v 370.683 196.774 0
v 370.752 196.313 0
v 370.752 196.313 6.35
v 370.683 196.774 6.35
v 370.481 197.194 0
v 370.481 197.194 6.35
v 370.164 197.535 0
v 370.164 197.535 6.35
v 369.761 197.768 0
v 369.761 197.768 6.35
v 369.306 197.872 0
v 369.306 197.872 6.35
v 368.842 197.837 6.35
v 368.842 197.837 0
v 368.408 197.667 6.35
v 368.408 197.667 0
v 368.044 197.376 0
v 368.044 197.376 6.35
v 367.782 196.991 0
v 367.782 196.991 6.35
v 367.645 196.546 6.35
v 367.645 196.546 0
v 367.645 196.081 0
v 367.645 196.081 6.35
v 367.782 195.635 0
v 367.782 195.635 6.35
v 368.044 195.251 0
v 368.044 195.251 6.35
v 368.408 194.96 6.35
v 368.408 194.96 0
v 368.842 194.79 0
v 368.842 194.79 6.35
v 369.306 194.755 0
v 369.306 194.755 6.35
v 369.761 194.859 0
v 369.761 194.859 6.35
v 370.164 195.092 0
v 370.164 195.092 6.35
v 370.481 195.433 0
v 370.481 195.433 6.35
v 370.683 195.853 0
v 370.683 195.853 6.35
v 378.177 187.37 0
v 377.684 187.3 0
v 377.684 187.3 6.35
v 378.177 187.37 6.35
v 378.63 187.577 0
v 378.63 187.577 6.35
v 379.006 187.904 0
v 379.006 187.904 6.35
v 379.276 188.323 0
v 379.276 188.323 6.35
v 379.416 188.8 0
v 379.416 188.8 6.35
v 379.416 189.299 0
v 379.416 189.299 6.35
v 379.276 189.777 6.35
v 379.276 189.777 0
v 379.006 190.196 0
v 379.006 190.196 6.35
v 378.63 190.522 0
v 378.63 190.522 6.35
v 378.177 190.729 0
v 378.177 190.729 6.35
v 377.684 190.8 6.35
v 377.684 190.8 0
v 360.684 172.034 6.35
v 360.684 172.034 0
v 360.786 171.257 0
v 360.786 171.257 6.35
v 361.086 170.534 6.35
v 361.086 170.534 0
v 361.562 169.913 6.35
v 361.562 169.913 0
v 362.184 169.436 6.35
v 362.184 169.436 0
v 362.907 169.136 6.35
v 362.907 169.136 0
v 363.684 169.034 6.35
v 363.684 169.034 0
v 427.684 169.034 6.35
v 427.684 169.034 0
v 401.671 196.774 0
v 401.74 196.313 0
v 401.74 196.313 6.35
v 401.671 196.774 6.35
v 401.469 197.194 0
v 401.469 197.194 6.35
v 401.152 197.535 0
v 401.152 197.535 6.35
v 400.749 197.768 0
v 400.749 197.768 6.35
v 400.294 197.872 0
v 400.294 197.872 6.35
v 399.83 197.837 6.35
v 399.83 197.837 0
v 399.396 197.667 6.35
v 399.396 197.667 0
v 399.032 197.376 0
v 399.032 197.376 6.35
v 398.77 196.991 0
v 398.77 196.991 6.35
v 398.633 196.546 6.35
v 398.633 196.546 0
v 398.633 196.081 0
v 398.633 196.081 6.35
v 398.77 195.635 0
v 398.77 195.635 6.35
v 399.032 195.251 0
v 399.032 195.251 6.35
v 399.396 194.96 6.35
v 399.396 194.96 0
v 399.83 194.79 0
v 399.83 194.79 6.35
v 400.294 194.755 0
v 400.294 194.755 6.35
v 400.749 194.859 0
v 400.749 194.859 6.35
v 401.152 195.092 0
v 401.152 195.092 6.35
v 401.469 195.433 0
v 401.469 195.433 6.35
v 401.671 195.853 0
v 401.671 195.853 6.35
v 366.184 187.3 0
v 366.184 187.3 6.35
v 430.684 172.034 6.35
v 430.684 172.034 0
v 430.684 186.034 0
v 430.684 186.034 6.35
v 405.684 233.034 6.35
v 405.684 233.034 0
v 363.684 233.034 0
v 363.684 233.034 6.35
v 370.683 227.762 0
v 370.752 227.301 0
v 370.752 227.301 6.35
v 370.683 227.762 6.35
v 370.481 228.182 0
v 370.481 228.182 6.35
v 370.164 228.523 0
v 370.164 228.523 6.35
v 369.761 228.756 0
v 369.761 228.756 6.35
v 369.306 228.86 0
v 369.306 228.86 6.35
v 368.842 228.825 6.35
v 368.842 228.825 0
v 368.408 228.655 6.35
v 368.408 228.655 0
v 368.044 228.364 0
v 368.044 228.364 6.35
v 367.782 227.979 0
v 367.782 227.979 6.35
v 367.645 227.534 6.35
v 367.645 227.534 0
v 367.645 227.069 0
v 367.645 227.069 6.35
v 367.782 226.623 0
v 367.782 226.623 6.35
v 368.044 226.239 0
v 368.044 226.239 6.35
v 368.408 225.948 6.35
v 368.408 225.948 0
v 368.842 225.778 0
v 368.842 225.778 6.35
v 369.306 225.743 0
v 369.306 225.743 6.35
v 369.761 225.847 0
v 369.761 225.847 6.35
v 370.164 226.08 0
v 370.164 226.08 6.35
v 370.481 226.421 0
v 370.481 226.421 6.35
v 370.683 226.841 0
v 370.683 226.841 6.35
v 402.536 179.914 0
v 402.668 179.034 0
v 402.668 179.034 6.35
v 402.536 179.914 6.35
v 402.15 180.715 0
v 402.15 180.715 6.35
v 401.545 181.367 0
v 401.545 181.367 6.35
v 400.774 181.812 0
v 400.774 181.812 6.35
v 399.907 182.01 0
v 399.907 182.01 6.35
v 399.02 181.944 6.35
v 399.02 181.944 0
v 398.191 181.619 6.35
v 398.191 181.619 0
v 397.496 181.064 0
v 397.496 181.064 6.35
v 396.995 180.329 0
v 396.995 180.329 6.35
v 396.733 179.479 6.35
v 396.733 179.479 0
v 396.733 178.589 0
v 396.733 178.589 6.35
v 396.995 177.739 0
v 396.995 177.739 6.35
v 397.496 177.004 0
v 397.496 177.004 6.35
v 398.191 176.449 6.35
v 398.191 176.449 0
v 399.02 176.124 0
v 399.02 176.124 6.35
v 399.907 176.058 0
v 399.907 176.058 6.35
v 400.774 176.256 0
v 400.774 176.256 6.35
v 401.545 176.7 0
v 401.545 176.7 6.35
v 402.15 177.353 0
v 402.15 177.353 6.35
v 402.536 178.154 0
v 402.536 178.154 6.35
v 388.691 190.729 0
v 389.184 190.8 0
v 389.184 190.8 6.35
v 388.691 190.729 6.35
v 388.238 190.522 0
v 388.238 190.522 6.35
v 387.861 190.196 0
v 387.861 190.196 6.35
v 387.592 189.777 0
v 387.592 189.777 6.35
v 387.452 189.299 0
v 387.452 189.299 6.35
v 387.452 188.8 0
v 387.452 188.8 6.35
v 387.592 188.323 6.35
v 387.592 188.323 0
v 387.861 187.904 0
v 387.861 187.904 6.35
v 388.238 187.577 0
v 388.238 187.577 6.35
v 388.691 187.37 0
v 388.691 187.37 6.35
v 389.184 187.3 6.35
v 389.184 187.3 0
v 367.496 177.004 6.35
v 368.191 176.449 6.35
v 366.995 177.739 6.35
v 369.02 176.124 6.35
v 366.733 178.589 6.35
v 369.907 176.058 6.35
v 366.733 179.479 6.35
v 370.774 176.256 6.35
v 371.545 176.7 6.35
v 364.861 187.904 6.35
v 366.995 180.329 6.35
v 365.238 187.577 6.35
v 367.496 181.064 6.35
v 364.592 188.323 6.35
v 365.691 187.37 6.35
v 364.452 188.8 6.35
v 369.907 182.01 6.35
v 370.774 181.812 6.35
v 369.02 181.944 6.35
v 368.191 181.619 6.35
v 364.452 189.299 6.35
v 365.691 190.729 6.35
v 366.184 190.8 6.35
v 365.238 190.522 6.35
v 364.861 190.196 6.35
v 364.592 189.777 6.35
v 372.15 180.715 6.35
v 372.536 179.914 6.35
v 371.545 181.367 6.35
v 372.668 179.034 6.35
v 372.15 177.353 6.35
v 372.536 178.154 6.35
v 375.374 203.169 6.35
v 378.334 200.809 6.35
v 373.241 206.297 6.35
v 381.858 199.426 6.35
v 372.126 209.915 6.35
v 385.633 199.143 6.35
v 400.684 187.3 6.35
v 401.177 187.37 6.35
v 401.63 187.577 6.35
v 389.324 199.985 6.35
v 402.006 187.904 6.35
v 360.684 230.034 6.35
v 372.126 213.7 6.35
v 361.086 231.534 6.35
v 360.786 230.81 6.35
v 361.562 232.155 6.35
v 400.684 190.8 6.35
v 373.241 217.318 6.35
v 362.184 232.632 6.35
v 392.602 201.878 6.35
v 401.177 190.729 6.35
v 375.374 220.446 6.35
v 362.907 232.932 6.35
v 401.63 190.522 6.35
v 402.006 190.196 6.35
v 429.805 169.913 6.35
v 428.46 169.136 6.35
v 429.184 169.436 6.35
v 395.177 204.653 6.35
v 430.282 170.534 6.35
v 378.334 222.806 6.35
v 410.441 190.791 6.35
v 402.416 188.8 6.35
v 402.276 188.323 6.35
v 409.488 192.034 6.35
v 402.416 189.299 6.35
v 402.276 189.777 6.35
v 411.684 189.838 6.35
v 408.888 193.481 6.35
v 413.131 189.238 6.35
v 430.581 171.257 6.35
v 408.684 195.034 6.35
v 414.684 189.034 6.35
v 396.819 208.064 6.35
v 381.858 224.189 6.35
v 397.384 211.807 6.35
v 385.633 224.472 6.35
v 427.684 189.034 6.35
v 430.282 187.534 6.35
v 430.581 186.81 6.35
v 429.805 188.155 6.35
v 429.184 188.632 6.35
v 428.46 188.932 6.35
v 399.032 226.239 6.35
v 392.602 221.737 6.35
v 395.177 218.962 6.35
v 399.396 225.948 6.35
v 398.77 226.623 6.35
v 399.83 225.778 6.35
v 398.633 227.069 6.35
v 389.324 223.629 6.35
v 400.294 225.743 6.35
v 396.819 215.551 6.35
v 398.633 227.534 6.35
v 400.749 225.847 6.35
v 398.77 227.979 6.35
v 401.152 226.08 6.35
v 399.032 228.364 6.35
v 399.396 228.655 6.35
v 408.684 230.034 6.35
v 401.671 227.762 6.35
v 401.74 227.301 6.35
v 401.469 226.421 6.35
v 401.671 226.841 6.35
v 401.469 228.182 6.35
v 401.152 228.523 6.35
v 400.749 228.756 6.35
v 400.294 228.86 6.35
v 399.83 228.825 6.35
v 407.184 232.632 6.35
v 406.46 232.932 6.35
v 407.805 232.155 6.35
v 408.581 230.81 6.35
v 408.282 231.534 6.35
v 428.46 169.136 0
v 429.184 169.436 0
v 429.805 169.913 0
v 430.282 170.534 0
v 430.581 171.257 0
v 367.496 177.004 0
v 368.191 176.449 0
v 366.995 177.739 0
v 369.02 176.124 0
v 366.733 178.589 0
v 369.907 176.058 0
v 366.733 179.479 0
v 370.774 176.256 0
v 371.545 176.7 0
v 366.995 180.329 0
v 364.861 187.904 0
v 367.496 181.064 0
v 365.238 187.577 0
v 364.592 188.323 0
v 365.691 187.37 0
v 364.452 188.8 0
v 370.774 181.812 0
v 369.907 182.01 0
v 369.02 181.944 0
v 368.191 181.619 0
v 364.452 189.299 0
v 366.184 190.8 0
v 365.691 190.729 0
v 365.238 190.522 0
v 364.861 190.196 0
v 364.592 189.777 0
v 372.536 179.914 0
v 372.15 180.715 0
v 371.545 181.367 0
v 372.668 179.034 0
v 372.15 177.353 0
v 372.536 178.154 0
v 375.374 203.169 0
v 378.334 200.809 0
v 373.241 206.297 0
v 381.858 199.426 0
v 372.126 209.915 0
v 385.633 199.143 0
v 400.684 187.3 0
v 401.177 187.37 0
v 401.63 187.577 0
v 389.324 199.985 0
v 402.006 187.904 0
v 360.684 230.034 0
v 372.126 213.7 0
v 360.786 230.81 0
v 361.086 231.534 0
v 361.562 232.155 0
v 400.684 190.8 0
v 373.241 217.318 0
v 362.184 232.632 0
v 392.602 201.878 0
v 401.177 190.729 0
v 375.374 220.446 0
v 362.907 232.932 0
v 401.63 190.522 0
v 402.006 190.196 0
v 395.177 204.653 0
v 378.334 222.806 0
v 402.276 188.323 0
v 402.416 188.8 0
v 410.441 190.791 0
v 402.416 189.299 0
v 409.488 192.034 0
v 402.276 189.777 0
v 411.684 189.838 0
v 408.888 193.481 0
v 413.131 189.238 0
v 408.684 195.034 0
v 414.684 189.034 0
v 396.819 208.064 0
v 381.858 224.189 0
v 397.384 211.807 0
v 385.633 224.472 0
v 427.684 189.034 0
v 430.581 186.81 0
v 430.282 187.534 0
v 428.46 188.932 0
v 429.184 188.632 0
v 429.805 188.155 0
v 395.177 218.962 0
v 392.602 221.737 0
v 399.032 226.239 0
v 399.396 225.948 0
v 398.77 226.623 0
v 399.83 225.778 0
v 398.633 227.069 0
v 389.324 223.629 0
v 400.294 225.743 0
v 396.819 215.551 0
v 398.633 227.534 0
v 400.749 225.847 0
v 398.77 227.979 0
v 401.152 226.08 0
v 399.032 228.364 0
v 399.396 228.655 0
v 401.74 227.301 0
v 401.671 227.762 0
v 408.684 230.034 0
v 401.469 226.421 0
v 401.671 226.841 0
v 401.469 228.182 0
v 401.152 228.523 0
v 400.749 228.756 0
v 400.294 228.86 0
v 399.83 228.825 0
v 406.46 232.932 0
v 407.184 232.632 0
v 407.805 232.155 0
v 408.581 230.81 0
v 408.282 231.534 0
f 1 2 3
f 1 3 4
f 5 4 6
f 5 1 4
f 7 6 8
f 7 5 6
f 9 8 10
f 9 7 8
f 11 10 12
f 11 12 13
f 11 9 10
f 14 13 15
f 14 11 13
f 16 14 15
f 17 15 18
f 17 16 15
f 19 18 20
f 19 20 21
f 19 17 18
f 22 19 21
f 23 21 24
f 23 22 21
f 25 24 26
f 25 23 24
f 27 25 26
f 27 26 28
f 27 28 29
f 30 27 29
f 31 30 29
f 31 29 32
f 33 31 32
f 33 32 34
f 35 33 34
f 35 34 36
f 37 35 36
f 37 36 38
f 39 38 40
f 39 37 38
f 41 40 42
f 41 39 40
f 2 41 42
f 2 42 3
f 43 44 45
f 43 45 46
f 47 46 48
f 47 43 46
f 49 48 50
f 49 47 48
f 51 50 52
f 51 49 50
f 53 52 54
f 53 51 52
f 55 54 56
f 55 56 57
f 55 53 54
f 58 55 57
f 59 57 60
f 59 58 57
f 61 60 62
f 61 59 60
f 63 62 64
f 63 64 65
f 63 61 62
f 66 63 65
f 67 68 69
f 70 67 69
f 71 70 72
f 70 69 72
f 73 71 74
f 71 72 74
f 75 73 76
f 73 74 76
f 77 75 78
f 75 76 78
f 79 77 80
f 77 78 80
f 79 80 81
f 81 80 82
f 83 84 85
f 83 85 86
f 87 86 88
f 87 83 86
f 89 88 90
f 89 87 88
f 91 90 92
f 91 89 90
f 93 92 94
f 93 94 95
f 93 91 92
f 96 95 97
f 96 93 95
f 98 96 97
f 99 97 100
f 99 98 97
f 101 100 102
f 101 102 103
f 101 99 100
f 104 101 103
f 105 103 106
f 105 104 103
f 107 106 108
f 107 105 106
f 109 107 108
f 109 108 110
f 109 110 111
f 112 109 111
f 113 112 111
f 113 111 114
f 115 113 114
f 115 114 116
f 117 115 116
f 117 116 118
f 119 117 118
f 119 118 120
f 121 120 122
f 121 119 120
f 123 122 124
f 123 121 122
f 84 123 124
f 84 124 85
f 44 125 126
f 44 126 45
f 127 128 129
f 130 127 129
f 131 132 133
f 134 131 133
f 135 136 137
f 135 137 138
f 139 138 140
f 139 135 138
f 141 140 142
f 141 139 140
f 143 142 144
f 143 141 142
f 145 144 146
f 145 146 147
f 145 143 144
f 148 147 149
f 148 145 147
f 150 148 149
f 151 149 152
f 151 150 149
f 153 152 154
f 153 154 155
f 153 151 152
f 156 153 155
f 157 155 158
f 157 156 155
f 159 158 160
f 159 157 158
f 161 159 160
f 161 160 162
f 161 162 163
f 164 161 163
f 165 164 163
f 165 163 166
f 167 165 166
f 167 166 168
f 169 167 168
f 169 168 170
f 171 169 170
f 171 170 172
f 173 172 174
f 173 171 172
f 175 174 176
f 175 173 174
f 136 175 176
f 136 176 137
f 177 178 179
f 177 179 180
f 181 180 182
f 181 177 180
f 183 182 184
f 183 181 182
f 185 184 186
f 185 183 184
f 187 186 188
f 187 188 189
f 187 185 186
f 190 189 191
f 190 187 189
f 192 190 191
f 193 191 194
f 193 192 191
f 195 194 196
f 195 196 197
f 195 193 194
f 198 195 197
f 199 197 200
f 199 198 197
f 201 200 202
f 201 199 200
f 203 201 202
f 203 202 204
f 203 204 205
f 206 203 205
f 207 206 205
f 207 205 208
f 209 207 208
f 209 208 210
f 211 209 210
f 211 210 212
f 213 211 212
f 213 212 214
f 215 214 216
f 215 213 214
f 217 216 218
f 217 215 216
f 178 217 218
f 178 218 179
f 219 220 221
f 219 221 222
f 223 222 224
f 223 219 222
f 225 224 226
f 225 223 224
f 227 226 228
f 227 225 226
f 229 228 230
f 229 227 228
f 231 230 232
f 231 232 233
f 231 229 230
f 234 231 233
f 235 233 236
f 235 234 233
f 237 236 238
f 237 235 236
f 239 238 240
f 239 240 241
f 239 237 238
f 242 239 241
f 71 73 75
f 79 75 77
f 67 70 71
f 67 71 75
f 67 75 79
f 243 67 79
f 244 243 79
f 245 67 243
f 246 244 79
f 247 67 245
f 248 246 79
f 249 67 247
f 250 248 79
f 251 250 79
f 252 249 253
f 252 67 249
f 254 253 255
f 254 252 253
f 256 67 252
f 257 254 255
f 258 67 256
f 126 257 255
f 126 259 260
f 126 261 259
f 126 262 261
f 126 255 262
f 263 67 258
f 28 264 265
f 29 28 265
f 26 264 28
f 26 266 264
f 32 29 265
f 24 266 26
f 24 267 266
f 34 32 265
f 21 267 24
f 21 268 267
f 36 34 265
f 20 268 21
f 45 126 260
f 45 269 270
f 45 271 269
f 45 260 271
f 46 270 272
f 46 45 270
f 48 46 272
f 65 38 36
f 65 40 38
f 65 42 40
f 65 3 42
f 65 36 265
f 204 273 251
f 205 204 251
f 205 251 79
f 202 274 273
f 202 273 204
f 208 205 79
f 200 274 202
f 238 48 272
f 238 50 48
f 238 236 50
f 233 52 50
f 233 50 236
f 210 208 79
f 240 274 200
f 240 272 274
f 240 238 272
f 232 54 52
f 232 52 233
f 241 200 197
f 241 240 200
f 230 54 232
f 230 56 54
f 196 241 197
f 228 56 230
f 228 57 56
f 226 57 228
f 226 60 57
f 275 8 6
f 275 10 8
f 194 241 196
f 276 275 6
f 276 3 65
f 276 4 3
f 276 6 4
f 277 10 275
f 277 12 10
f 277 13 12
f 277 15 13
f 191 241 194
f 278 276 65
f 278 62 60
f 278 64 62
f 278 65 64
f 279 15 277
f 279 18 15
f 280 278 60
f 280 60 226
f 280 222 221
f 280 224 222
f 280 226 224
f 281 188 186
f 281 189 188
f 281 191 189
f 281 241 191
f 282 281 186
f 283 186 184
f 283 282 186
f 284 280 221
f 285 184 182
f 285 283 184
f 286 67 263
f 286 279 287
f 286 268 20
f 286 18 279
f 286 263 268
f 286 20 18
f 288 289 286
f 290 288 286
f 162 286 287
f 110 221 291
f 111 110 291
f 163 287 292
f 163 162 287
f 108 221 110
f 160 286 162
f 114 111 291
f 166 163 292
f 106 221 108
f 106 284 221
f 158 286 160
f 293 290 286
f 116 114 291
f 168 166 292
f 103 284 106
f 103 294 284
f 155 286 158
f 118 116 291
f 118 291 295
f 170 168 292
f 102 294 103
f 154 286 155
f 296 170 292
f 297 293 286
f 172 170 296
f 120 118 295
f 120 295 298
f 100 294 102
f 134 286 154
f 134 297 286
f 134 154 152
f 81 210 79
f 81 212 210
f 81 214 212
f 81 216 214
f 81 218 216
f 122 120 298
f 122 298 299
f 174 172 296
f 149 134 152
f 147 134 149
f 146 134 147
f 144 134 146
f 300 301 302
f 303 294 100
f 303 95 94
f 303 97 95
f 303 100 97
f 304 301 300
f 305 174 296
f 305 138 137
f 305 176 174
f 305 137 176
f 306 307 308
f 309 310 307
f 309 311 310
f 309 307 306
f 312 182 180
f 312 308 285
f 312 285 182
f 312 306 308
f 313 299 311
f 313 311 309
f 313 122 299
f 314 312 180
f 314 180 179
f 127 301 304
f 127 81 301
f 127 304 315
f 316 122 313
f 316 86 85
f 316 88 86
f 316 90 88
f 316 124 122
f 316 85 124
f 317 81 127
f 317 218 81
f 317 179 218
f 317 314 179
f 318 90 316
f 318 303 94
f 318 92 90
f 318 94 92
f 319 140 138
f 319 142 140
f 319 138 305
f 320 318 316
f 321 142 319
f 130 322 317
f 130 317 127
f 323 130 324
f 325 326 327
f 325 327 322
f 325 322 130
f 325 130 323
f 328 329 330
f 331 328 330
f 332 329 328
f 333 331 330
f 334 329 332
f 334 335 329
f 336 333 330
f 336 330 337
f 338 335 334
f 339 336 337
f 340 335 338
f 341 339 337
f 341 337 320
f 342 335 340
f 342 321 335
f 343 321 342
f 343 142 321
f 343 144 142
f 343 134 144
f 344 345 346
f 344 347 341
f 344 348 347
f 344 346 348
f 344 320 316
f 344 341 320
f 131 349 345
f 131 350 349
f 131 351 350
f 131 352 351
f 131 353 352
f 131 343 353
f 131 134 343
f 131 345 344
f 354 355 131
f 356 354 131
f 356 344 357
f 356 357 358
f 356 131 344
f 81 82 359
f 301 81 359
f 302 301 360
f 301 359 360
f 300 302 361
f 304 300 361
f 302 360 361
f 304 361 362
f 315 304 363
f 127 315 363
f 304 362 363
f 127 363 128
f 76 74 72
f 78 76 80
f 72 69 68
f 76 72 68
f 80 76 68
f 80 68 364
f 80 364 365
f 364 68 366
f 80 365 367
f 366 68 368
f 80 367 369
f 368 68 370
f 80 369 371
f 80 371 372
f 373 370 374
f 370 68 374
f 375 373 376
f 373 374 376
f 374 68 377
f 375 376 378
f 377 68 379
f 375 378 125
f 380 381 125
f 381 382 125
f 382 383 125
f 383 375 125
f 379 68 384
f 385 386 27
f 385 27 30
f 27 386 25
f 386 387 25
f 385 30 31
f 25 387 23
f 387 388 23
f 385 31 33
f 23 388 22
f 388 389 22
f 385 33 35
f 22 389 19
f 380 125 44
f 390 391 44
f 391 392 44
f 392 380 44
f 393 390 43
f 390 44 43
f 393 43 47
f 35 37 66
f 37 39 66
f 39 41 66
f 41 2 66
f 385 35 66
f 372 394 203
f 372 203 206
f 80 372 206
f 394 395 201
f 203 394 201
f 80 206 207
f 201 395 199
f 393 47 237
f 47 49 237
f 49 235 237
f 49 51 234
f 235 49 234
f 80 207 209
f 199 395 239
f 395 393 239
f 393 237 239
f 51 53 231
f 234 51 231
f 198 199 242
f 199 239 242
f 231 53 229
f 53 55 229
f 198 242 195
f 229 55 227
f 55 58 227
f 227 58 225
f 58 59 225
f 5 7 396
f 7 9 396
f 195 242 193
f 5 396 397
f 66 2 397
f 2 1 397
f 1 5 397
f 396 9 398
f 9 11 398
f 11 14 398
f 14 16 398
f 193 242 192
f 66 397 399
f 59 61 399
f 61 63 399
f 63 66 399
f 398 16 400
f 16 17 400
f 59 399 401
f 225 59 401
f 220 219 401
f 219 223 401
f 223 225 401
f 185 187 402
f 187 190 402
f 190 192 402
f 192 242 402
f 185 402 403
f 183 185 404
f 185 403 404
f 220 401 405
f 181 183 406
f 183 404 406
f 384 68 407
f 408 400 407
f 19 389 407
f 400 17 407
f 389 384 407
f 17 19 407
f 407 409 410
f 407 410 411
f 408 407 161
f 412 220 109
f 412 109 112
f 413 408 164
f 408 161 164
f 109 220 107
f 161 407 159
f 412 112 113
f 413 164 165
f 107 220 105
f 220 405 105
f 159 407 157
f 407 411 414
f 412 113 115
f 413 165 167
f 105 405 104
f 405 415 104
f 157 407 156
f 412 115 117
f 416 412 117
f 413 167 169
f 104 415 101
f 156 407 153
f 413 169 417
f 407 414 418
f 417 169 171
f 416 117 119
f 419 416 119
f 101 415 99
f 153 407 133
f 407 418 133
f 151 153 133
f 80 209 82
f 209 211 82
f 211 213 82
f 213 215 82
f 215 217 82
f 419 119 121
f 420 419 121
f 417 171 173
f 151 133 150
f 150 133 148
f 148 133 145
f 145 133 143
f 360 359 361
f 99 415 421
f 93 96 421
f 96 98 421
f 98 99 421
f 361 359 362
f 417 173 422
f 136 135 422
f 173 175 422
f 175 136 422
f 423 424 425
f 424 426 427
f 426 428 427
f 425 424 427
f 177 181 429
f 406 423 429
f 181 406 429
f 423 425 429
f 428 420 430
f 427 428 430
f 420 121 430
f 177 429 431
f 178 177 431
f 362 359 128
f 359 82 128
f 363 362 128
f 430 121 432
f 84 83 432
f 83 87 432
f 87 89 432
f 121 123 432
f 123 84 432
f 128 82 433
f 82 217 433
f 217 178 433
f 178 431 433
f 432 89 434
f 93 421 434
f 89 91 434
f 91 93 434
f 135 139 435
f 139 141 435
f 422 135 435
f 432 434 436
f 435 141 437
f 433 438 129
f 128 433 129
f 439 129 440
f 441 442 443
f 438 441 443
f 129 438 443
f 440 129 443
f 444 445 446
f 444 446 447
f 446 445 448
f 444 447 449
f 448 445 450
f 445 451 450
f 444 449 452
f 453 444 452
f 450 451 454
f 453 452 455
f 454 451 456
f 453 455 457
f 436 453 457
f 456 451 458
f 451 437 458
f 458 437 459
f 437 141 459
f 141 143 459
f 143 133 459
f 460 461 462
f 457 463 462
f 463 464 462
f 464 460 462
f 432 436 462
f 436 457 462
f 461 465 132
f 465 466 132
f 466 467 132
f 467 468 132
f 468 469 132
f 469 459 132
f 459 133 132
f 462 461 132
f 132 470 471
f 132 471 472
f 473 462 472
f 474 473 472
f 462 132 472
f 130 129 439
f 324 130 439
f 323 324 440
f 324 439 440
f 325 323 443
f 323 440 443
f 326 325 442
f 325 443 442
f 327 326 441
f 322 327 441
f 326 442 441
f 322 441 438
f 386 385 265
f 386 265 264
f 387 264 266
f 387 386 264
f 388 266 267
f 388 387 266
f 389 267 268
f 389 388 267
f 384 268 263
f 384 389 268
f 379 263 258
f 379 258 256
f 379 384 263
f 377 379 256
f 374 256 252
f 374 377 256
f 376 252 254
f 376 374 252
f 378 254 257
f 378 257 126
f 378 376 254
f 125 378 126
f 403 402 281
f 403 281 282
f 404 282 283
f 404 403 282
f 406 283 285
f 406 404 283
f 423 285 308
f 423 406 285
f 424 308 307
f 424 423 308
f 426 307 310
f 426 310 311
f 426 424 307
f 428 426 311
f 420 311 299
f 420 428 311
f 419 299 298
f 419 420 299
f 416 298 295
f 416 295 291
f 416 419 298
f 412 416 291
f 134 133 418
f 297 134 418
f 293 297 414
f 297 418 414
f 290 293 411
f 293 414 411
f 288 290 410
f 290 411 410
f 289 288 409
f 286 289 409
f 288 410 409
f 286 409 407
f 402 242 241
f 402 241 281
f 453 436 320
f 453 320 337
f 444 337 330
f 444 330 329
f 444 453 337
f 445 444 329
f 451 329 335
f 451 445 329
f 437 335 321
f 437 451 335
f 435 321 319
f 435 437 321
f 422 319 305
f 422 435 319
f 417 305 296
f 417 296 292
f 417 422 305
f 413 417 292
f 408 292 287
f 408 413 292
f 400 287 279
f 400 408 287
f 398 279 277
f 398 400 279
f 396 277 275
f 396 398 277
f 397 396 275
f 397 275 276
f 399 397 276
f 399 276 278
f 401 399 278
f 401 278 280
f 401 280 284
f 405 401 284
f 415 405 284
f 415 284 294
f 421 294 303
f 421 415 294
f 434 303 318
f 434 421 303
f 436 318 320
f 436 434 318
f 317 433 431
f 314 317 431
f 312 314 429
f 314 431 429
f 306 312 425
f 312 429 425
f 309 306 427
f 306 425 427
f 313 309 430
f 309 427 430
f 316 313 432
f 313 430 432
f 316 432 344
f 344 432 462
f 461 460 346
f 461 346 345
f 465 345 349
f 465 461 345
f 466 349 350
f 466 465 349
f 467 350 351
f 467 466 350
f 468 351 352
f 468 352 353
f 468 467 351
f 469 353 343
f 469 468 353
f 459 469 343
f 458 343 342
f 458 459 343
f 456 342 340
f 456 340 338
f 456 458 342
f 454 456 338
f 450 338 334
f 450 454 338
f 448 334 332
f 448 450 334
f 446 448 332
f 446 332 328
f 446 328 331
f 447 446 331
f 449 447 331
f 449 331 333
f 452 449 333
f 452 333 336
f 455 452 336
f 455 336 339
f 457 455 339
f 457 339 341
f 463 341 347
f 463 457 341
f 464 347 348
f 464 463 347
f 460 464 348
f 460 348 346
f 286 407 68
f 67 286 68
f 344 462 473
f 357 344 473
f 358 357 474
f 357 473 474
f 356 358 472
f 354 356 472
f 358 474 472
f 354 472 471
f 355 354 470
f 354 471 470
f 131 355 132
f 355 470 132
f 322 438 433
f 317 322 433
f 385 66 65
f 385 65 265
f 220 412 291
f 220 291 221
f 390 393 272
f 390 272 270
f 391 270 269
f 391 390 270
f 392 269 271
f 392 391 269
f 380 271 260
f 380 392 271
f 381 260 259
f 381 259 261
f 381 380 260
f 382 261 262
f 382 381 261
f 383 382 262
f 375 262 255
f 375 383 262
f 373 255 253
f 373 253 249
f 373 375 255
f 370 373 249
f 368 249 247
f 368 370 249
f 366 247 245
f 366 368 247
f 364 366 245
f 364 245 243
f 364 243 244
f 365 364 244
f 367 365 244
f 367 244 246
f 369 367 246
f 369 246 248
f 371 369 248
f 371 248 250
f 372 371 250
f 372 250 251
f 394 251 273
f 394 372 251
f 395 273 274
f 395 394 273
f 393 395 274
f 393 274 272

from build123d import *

# Parameters (mm, degrees)
SKETCH1_R           = 2.9845
SKETCH1_R_2         = 1.562499999
SKETCH1_R_3         = 12.7
BOSS_EXTRUDE1_DEPTH = 6.35


with BuildPart() as part:
    # Sketch1 → Boss-Extrude1 (new body)
    with BuildSketch(Plane.XY):
        with BuildLine():
            Line((363.683701588, 169.033854224), (427.683701589, 169.033854224))
            ThreePointArc((427.683701589, 169.033854224), (429.805021933, 169.912533881), (430.68370159, 172.033854225))
            Line((430.68370159, 172.033854225), (430.68370159, 186.033854223))
            ThreePointArc((430.68370159, 186.033854223), (429.805021933, 188.155174567), (427.683701588, 189.033854223))
            Line((427.683701588, 189.033854223), (414.683701589, 189.033854223))
            ThreePointArc((414.683701589, 189.033854223), (410.4410609, 190.791213536), (408.683701587, 195.033854224))
            Line((408.683701587, 195.033854224), (408.683701587, 230.033854224))
            ThreePointArc((408.683701587, 230.033854224), (407.805021931, 232.155174567), (405.683701588, 233.033854223))
            Line((405.683701588, 233.033854223), (363.683701587, 233.033854223))
            ThreePointArc((363.683701587, 233.033854223), (361.562381244, 232.155174567), (360.683701588, 230.033854224))
            Line((360.683701588, 230.033854224), (360.683701588, 172.033854225))
            ThreePointArc((360.683701588, 172.033854225), (361.562381244, 169.912533881), (363.683701588, 169.033854224))
        make_face()
        with Locations((369.683701589, 179.033854223)):
            Circle(SKETCH1_R, mode=Mode.SUBTRACT)
        with Locations((399.683701589, 179.033854223)):
            Circle(SKETCH1_R, mode=Mode.SUBTRACT)
        with Locations((369.189701589, 196.313382783)):
            Circle(SKETCH1_R_2, mode=Mode.SUBTRACT)
        with Locations((400.177701589, 196.313382783)):
            Circle(SKETCH1_R_2, mode=Mode.SUBTRACT)
        with Locations((384.683701589, 211.807382783)):
            Circle(SKETCH1_R_3, mode=Mode.SUBTRACT)
        with Locations((369.189701589, 227.301382783)):
            Circle(SKETCH1_R_2, mode=Mode.SUBTRACT)
        with Locations((400.177701589, 227.301382783)):
            Circle(SKETCH1_R_2, mode=Mode.SUBTRACT)
        with BuildLine():
            Line((366.183701588, 187.299538128), (377.683701588, 187.299538128))
            ThreePointArc((377.683701588, 187.299538128), (379.433701588, 189.049538128), (377.683701588, 190.799538128))
            Line((377.683701588, 190.799538128), (366.183701588, 190.799538128))
            ThreePointArc((366.183701588, 190.799538128), (364.433701588, 189.049538128), (366.183701588, 187.299538128))
        make_face(mode=Mode.SUBTRACT)
        with BuildLine():
            Line((389.183701588, 187.299538128), (400.683701588, 187.299538128))
            ThreePointArc((400.683701588, 187.299538128), (402.433701588, 189.049538128), (400.683701588, 190.799538128))
            Line((400.683701588, 190.799538128), (389.183701588, 190.799538128))
            ThreePointArc((389.183701588, 190.799538128), (387.433701588, 189.049538128), (389.183701588, 187.299538128))
        make_face(mode=Mode.SUBTRACT)
    extrude(amount=BOSS_EXTRUDE1_DEPTH)


solid = part.part
